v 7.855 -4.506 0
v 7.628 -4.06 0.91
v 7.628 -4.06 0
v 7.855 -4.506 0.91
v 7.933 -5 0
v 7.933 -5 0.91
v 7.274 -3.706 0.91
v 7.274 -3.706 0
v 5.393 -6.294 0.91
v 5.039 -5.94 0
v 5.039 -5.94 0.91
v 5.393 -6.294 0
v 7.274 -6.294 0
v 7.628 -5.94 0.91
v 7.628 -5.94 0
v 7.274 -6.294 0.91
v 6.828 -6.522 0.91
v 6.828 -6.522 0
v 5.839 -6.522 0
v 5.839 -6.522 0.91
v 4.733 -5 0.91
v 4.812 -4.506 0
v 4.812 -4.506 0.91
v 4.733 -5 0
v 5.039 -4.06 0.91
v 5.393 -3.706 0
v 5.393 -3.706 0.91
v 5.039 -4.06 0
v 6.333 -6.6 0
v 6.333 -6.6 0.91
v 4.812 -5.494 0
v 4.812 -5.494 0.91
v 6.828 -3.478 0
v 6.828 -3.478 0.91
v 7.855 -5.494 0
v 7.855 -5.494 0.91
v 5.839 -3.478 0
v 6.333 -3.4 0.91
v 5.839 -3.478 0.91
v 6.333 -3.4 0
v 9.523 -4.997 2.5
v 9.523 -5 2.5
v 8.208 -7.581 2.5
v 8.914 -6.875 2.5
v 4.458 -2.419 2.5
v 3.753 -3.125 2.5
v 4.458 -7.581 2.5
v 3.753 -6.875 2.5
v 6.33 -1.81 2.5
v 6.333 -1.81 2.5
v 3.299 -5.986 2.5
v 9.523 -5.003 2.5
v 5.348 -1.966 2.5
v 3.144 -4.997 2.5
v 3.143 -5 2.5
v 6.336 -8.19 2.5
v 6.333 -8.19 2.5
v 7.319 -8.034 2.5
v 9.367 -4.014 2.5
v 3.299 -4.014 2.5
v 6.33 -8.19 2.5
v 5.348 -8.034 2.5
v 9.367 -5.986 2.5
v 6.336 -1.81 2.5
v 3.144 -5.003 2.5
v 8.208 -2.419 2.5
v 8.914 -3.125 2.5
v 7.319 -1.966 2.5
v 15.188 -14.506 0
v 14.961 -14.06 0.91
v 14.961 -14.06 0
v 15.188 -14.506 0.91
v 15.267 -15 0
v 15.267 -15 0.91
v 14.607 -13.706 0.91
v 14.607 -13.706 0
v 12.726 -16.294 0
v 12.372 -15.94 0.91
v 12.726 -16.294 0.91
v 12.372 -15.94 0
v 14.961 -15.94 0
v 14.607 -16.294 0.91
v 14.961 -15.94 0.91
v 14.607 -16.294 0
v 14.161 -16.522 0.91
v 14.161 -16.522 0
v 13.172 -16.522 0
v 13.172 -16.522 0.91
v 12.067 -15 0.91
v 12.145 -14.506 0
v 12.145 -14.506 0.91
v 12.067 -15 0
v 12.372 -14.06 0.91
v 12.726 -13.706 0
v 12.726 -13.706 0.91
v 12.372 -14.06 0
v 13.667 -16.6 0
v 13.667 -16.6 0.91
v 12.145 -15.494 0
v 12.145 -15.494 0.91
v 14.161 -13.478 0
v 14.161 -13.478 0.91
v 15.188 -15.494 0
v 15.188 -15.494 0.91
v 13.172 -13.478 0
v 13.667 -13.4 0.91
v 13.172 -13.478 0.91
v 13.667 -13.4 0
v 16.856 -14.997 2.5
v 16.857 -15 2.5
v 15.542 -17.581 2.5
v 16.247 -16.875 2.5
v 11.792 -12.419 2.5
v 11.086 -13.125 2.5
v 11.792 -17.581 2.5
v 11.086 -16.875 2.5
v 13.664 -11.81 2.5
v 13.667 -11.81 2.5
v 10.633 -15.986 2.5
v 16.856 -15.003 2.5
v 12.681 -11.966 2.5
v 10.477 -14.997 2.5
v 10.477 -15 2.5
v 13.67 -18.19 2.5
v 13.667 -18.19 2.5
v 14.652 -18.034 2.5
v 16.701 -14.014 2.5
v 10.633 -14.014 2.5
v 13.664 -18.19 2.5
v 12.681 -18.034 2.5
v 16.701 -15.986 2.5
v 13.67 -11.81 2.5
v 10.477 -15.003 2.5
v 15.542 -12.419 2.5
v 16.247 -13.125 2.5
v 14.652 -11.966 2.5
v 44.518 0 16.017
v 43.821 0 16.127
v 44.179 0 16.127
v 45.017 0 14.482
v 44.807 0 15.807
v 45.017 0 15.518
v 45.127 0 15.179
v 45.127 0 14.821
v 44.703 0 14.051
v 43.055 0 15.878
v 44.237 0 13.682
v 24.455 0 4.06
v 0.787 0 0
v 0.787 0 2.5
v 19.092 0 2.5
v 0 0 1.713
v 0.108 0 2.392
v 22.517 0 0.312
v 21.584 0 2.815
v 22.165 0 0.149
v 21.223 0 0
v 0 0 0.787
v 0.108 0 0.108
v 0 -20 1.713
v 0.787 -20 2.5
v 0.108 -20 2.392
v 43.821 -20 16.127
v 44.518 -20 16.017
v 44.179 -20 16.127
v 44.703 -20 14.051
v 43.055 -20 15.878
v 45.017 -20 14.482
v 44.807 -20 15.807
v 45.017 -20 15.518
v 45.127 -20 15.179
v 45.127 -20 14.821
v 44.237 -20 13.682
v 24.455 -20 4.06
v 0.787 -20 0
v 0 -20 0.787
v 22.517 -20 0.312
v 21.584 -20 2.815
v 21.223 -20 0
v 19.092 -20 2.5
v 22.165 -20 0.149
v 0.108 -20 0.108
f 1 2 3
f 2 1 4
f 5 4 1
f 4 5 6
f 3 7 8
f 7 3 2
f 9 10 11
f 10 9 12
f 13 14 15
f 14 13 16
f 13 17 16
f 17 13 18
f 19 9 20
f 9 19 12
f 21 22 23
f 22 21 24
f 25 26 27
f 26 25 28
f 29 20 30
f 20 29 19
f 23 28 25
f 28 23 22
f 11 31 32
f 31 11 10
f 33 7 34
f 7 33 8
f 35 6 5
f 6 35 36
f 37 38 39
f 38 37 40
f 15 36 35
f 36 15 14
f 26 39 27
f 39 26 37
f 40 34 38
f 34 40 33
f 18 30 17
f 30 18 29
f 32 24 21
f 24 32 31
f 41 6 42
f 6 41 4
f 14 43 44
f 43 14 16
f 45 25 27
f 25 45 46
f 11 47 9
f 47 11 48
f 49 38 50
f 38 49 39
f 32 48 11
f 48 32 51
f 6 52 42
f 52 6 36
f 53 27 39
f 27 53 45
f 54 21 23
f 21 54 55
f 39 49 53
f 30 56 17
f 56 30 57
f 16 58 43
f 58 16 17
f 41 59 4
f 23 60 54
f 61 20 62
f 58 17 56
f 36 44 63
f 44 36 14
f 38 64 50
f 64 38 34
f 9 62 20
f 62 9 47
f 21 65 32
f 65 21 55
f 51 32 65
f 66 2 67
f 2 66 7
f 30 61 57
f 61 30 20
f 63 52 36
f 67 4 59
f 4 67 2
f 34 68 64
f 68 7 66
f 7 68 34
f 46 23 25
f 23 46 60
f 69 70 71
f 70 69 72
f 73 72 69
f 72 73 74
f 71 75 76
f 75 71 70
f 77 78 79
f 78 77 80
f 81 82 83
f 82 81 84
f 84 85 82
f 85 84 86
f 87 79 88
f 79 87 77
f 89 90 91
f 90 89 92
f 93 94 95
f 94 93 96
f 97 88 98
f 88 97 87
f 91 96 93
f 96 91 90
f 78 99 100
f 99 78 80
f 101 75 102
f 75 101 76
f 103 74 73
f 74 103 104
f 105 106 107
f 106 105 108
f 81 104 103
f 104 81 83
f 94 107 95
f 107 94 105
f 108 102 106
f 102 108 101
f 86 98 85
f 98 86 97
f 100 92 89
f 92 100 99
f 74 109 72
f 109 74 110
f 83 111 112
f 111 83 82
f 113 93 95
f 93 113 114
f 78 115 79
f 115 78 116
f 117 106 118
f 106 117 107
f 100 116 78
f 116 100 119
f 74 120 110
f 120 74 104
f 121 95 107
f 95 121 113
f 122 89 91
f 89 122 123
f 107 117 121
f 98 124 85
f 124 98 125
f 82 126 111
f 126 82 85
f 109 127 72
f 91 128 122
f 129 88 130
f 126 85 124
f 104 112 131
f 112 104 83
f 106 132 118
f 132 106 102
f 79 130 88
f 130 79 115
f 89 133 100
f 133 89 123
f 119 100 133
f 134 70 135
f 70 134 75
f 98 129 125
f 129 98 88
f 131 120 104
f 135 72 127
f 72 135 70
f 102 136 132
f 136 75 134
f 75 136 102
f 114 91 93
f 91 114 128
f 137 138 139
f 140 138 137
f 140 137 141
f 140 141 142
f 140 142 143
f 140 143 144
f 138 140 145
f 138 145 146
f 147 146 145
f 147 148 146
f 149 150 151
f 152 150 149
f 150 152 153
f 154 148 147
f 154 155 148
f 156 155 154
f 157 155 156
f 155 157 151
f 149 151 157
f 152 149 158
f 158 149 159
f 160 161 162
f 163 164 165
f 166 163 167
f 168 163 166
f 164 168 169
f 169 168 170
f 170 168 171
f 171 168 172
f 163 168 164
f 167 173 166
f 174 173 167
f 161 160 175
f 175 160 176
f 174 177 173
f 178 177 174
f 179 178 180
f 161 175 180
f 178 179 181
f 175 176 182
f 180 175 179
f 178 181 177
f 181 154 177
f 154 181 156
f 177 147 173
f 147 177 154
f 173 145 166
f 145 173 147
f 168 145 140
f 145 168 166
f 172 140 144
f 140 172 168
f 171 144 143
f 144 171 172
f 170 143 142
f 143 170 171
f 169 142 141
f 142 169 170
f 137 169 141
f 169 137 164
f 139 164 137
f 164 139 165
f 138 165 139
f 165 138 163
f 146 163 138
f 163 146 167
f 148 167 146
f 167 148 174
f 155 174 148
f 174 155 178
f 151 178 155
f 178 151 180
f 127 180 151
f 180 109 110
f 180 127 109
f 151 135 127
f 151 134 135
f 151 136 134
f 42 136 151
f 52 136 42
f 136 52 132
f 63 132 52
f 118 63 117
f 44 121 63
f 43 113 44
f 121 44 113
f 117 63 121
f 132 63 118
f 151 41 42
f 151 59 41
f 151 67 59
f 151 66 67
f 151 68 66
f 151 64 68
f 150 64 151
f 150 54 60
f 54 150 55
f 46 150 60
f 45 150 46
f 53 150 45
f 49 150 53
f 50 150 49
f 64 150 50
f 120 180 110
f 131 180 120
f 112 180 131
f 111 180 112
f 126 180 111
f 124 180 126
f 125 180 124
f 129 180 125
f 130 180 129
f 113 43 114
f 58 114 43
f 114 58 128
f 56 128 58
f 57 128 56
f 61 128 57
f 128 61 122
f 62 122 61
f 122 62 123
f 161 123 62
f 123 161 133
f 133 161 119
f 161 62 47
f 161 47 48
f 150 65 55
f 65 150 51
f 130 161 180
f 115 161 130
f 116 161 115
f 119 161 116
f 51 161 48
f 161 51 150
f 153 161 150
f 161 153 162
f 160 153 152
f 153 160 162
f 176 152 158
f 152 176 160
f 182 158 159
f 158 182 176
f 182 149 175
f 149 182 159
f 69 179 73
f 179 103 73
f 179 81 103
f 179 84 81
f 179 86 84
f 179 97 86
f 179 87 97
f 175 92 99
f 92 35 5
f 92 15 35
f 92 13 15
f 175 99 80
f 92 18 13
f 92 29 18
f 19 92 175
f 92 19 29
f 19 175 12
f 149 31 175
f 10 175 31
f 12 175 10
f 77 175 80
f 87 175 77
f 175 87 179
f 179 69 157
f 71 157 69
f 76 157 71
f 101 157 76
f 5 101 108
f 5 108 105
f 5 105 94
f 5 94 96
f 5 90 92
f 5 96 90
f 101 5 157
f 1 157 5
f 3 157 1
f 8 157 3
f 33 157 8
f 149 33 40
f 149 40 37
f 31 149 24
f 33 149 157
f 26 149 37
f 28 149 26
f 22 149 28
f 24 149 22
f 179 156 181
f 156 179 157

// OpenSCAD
THICKNESS = 2.5;
WIDTH = 20;
FLAT = 22;
OUT = 15;

$fn=20;

SCREW_DIA = 3.2;
difference() {
  rotate([90,0,0]) linear_extrude(WIDTH) offset(-10) offset(10) {
    square([FLAT, THICKNESS]);
    hull() {
      translate([FLAT,0]) square([0.01, THICKNESS]);
      translate([FLAT*2,OUT]) circle(d=THICKNESS);
    }
  }
  
  translate([FLAT/3-1,-WIDTH/4,0]) ScrewHole(THICKNESS);
  translate([FLAT/3*2-1,-WIDTH/4*3,0]) ScrewHole(THICKNESS);
}

module ScrewHole(t) {
  translate([0,0,-0.01]) cylinder(d=SCREW_DIA,h=t+0.02);
  translate([0,0,t-SCREW_DIA/2+0.01]) cylinder(r1=SCREW_DIA/2,r2=SCREW_DIA,h=SCREW_DIA/2);
}


*linear_extrude(WIDTH)  {
  square([FLAT, THICKNESS]);
  translate([FLAT,0]) rotate(25) offset(-10) offset(10) square([FLAT, THICKNESS]);
}

*difference() {
  union() {
    cube([FLAT, WIDTH, THICKNES]);
    translate([FLAT,0,0]) rotate([0,-15,0]) cube([FLAT, WIDTH, THICKNES]);
  }
}
